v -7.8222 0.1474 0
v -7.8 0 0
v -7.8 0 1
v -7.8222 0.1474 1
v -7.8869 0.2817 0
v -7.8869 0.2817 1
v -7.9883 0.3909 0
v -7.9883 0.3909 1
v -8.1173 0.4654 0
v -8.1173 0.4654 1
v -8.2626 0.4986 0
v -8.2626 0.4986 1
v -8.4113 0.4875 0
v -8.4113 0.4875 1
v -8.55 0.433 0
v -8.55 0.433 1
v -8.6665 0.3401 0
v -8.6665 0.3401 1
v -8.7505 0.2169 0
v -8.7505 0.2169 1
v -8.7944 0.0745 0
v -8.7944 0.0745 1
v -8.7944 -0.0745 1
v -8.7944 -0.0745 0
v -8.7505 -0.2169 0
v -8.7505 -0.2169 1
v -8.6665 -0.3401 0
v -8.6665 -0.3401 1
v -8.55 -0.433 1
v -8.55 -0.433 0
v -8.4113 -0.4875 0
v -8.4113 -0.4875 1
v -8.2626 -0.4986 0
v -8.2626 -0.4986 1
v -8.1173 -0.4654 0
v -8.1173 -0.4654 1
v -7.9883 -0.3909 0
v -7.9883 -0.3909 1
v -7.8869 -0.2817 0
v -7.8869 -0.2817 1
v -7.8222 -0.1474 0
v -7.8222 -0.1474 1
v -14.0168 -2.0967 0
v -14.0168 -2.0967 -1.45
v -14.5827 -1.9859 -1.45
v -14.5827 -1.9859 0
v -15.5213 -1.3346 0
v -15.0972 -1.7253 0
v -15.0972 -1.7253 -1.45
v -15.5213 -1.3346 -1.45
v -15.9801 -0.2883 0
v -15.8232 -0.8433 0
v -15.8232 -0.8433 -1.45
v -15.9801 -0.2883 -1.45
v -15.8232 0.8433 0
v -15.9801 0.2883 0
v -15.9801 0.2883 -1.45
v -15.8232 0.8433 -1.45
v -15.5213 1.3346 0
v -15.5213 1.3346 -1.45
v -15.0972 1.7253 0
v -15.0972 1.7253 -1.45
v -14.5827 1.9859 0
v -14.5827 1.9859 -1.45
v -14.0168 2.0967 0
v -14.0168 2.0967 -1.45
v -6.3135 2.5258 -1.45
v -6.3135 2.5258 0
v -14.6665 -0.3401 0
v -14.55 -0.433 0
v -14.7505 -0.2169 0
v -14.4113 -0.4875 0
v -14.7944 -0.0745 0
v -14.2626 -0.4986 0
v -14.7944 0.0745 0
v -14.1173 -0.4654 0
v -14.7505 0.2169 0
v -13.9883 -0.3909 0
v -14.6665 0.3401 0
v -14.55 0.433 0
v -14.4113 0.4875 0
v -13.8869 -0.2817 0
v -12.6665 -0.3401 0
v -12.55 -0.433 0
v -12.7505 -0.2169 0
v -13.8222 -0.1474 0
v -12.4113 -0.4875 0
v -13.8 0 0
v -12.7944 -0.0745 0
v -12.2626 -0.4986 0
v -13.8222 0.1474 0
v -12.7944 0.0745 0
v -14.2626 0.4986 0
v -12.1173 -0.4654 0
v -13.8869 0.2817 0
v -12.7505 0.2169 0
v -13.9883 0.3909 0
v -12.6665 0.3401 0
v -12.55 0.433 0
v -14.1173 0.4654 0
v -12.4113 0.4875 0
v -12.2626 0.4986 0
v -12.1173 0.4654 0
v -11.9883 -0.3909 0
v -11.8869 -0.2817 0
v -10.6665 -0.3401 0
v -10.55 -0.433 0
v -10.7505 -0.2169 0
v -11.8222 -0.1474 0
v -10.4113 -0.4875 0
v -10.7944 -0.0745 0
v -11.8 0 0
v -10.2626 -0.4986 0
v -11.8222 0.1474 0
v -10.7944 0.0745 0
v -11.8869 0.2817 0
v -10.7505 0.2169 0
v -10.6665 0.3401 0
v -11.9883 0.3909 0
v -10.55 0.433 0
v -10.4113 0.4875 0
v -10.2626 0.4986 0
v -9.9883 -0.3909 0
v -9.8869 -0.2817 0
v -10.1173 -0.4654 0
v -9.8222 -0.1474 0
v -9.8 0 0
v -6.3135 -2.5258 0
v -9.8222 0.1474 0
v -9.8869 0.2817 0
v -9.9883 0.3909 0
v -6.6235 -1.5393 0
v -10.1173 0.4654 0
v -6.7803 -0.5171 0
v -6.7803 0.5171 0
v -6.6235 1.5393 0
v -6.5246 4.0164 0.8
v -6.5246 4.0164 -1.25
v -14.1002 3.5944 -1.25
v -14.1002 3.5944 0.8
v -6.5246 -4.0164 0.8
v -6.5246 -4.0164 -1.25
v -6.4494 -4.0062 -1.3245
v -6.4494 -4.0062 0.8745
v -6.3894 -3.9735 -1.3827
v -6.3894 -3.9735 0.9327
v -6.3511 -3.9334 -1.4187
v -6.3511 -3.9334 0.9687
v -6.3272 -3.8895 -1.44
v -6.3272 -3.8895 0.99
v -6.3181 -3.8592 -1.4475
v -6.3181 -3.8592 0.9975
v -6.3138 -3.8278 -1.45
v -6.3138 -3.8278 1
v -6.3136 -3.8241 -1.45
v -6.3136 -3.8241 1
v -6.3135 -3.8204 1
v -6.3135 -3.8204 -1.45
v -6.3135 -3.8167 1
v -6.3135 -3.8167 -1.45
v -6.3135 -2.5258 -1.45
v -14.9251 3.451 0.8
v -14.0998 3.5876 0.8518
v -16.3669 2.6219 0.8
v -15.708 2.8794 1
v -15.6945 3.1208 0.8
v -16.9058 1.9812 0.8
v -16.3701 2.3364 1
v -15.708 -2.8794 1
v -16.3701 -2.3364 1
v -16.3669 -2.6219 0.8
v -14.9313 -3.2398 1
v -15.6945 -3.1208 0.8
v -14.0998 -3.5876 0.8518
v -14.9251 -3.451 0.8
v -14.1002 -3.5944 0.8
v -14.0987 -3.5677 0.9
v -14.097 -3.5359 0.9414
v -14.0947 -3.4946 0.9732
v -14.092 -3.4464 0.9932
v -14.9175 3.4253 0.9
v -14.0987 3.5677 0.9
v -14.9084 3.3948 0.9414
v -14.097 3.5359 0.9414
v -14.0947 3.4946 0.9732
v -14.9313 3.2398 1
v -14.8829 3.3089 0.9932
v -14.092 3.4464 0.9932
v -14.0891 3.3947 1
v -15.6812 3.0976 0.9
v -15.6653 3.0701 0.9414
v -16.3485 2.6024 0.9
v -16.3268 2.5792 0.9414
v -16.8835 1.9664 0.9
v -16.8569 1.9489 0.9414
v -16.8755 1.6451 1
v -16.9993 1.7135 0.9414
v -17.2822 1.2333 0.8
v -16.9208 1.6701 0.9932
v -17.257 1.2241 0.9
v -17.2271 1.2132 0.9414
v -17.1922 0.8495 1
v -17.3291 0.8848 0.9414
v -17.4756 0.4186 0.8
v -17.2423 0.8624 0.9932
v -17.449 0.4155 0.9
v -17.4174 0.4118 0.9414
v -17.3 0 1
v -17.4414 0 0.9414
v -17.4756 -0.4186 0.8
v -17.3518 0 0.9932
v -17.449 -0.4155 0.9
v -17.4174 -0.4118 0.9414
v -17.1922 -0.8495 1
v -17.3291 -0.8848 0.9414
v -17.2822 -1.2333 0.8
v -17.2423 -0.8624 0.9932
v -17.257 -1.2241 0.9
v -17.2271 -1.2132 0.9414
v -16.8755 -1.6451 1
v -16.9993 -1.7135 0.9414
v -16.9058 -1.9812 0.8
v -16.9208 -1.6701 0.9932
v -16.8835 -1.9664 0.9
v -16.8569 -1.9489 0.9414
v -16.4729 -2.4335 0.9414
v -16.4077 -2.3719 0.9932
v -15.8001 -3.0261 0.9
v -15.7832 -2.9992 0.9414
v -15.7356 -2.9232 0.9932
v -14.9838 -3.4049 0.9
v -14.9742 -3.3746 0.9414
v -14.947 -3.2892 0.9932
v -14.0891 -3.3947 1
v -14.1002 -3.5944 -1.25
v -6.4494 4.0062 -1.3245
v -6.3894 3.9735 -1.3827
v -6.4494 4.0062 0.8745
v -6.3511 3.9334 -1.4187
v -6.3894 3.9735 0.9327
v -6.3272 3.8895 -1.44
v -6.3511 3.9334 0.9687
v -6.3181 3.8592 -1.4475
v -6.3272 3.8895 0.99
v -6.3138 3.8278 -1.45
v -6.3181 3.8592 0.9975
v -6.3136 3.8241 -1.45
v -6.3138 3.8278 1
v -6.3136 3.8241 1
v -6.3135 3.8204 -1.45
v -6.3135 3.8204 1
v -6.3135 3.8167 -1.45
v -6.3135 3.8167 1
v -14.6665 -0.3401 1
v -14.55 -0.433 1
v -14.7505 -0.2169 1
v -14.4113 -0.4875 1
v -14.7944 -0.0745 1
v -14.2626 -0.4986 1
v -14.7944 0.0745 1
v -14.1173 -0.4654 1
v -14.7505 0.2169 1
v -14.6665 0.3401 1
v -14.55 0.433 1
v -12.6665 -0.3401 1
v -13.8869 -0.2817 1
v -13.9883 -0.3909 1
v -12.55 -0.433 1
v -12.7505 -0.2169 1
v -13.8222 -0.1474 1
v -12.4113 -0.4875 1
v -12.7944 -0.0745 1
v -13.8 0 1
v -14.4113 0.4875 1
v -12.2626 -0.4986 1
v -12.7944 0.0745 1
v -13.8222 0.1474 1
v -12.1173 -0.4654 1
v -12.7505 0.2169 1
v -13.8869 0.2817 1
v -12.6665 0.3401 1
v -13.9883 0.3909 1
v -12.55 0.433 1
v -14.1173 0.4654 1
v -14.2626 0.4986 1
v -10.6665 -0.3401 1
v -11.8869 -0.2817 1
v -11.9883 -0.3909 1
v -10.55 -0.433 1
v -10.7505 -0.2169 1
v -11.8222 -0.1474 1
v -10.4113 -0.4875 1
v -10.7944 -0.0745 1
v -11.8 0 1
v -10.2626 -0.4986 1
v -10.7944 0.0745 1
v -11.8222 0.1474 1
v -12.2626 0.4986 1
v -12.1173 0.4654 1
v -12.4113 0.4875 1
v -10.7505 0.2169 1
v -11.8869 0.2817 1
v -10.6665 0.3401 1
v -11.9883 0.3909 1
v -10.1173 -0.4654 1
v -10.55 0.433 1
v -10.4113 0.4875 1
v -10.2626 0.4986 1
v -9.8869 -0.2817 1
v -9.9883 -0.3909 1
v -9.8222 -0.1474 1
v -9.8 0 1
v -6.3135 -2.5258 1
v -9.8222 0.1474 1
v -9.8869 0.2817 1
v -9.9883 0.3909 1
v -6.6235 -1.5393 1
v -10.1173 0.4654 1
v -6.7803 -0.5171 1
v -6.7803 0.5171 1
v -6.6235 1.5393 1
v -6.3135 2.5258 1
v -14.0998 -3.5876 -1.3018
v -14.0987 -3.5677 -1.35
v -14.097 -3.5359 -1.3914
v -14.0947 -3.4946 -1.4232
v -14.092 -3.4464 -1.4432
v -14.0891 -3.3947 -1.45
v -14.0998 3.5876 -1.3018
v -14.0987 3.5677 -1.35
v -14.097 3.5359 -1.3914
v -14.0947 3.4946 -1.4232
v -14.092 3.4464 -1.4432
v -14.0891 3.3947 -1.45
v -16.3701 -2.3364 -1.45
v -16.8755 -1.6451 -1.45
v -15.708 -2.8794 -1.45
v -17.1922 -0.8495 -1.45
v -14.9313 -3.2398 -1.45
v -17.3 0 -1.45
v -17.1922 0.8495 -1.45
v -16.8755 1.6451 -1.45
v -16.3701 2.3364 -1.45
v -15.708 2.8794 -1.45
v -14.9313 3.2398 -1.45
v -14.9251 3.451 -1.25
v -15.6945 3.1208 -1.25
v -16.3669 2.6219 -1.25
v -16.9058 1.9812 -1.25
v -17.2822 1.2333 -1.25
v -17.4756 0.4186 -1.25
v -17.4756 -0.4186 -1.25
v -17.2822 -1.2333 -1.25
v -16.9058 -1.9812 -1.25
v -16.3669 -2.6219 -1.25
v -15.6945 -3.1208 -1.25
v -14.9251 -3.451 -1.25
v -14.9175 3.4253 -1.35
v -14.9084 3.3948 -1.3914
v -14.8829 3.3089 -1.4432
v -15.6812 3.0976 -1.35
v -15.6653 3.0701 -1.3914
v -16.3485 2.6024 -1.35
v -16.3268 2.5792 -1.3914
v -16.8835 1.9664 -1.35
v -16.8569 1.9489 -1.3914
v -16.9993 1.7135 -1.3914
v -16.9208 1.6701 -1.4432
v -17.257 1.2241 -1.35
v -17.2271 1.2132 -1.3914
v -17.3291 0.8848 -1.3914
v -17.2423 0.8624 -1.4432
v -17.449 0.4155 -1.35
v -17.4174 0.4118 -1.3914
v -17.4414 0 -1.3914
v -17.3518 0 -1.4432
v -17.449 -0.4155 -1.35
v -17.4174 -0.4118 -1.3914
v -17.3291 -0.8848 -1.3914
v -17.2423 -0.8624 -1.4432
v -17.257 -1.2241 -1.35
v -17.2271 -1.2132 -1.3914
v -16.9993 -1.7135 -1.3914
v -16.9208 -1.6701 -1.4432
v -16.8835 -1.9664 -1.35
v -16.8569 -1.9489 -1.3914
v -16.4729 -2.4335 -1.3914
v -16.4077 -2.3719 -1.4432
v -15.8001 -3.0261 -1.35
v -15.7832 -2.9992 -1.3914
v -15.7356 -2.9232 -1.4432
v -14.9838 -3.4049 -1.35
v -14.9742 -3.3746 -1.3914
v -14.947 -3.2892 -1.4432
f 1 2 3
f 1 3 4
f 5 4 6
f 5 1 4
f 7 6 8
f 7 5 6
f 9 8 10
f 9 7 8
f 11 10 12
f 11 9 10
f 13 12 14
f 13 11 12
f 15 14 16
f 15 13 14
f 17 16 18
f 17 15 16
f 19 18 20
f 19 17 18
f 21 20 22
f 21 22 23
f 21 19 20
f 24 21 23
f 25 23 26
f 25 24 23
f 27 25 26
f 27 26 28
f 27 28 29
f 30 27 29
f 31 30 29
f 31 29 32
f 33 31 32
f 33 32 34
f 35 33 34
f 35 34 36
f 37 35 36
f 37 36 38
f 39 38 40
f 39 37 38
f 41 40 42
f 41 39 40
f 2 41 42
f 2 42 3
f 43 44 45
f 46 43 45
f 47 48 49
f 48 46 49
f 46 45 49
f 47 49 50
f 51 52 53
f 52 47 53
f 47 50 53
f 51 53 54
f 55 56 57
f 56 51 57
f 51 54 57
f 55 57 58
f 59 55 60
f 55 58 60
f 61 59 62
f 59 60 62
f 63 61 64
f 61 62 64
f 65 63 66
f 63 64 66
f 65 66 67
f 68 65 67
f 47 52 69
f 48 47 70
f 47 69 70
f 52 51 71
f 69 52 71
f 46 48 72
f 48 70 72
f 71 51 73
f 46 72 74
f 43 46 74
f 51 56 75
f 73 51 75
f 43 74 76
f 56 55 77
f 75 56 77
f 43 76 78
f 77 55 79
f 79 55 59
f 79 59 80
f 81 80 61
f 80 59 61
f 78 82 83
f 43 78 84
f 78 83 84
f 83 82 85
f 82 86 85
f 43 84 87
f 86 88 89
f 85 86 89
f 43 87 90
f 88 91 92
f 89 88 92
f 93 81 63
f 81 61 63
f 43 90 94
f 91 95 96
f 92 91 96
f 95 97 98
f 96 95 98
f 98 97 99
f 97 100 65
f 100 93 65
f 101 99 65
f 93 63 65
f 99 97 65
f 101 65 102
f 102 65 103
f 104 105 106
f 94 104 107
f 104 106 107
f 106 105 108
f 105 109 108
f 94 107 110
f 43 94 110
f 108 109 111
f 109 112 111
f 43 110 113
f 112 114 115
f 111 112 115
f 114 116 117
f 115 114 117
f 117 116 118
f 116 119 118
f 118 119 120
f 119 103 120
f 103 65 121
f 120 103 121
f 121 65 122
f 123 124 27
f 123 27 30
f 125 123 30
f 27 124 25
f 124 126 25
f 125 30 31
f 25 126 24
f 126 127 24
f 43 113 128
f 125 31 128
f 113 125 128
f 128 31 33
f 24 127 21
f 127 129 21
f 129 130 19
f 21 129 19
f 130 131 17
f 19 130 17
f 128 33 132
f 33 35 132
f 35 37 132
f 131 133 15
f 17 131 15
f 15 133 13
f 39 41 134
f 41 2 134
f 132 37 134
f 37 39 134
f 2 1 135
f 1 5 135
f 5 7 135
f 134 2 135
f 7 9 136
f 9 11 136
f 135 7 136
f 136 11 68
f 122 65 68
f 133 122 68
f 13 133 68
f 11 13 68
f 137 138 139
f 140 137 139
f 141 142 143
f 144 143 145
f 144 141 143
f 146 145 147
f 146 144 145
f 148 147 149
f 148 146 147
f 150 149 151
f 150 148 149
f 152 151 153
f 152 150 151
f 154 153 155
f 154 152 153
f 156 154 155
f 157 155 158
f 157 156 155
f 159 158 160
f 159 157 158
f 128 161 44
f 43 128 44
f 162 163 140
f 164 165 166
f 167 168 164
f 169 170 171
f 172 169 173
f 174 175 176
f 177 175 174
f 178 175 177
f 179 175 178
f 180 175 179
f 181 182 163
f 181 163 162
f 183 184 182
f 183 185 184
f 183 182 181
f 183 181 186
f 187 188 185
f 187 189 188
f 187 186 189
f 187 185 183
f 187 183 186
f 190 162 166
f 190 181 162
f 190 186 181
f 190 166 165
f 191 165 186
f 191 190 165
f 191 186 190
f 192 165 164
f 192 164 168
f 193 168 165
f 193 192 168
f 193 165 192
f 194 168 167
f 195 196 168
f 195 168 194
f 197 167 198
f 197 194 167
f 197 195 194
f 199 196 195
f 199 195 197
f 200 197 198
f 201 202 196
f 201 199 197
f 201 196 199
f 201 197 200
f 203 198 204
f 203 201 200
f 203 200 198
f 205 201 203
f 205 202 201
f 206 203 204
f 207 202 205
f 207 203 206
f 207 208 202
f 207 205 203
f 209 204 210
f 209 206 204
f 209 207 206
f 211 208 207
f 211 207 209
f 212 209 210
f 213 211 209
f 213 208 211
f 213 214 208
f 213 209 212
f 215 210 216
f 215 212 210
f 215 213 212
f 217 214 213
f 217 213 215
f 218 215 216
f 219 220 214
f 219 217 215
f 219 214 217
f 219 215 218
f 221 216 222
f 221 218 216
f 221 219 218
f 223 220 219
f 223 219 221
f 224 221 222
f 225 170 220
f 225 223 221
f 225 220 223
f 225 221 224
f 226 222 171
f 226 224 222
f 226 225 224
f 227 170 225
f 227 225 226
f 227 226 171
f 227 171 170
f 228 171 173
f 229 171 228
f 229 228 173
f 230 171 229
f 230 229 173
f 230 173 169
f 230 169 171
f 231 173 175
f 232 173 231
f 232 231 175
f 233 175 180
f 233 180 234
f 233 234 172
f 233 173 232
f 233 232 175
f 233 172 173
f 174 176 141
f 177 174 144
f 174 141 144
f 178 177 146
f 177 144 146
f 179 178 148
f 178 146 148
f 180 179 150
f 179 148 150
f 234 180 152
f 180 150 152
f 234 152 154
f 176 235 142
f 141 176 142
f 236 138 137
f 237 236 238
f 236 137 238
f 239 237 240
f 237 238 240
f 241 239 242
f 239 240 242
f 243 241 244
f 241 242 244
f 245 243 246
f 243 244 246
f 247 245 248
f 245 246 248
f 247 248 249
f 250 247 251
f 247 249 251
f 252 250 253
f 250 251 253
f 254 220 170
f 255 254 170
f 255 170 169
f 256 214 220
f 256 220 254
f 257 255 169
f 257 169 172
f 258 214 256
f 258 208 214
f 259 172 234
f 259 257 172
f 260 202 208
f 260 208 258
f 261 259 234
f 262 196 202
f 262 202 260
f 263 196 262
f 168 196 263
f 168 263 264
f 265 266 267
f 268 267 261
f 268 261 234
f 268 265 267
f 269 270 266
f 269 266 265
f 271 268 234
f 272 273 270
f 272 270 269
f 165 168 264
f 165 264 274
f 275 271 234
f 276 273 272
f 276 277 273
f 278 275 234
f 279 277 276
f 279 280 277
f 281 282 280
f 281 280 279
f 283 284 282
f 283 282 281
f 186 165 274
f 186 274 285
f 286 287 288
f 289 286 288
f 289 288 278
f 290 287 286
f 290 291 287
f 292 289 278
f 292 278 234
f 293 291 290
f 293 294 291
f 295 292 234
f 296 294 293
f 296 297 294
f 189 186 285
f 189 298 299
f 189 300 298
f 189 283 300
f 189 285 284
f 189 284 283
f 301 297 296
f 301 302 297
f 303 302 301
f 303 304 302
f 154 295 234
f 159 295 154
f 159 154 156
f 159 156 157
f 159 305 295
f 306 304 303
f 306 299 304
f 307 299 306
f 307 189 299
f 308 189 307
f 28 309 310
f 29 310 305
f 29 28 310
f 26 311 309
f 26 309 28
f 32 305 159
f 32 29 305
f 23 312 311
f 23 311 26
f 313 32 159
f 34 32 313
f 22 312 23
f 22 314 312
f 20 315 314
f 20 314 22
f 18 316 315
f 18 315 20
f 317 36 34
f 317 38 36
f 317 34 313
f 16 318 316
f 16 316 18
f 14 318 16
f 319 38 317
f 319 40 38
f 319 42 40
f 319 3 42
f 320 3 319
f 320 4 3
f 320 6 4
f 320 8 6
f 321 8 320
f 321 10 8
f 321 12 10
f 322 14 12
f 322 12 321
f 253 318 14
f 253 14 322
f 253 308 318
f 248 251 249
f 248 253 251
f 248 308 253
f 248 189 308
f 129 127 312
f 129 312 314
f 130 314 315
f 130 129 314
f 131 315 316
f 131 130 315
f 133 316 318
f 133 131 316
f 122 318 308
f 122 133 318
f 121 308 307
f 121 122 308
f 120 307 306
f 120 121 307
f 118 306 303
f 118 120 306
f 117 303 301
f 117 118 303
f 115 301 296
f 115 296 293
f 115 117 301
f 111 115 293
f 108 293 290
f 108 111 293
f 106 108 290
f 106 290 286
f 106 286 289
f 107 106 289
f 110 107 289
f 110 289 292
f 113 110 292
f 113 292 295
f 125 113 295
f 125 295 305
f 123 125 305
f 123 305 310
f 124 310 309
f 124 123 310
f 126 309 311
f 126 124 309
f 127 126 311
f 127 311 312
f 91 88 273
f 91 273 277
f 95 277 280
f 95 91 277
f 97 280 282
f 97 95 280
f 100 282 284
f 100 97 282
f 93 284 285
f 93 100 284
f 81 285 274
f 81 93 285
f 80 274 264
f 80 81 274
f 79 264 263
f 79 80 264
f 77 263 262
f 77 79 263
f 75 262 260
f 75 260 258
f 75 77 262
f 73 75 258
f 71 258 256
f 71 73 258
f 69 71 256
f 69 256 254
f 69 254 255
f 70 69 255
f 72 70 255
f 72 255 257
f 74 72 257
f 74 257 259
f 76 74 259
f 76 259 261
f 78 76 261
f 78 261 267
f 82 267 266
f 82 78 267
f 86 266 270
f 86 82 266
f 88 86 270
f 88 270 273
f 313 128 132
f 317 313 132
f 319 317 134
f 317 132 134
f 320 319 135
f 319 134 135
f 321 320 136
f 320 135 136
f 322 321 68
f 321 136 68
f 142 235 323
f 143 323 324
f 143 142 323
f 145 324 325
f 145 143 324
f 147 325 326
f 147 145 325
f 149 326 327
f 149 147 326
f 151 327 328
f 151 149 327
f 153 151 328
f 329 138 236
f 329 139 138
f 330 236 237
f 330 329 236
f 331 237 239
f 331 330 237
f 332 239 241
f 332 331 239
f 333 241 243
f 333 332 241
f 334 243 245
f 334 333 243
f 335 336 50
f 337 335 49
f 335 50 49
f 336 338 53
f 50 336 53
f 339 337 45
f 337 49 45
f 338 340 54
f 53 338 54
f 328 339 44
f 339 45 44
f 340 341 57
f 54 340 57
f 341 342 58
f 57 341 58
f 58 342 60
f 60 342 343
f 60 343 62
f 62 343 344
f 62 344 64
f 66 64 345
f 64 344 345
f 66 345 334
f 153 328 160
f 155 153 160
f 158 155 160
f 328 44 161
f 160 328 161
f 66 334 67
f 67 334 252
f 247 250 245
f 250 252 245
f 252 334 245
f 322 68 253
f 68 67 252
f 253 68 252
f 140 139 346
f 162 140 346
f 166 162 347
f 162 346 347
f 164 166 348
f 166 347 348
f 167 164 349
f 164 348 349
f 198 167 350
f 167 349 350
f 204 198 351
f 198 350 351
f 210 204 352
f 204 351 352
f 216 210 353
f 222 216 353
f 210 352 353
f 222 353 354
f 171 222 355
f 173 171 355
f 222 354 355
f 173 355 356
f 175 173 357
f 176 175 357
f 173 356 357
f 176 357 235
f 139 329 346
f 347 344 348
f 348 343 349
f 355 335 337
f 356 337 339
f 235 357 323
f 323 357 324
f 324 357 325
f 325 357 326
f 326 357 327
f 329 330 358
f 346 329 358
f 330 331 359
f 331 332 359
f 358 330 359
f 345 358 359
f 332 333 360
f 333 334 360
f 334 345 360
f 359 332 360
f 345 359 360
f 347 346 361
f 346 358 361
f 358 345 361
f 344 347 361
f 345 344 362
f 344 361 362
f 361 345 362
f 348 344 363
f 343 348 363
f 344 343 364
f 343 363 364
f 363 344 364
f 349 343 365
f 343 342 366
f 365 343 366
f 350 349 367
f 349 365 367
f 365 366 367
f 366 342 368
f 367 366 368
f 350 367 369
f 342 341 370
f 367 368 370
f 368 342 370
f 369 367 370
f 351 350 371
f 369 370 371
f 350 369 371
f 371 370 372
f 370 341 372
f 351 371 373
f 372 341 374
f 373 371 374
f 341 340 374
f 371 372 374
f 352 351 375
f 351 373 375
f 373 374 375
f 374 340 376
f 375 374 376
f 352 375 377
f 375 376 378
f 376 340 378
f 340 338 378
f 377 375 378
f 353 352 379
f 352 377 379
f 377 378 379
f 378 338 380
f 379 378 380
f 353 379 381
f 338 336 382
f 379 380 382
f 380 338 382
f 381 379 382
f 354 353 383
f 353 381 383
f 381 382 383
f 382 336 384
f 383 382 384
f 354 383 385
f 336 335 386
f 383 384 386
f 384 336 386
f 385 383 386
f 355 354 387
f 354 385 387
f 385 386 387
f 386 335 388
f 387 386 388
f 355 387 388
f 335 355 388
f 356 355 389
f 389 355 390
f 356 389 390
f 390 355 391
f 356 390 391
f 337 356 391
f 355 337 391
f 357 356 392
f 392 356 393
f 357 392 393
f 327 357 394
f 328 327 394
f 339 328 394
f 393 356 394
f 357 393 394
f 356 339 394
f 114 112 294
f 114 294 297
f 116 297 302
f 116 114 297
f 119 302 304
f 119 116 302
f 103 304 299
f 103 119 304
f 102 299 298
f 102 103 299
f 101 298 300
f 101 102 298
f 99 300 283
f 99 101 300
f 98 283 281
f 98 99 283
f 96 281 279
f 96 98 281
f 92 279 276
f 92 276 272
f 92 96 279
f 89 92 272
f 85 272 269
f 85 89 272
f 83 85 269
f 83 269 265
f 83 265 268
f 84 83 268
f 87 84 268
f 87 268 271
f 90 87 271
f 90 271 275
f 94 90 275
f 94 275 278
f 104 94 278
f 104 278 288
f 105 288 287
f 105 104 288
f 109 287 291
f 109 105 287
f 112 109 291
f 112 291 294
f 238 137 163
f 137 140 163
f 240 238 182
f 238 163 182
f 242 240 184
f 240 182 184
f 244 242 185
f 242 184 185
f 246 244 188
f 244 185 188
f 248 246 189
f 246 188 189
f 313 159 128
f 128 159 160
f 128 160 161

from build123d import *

# Parameters (mm, degrees)
SKETCH_1_R      = 0.5
EXTRUDE_1_DEPTH = 1
EXTRUDE_START   = -2.45
EXTRUDE_2_DEPTH = 2.45
FILLET_1_R      = 0.2


with BuildPart() as part:
    # 草图1 → 凸台-拉伸1 (new body)
    with BuildSketch(Plane.XY):
        with BuildLine():
            Line((-14.016792693, -2.096749739), (-6.313489141, -2.525837459))
            ThreePointArc((-6.313489141, -2.525837459), (-6.8, 0), (-6.313489141, 2.525837459))
            Line((-6.313489141, 2.525837459), (-14.016792693, 2.096749739))
            ThreePointArc((-14.016792693, 2.096749739), (-16, 0), (-14.016792693, -2.096749739))
        make_face()
        with Locations((-10.3, 0)):
            Circle(SKETCH_1_R, mode=Mode.SUBTRACT)
        with Locations((-14.3, 0)):
            Circle(SKETCH_1_R, mode=Mode.SUBTRACT)
        with Locations((-8.3, 0)):
            Circle(SKETCH_1_R, mode=Mode.SUBTRACT)
        with Locations((-12.3, 0)):
            Circle(SKETCH_1_R, mode=Mode.SUBTRACT)
    extrude(amount=EXTRUDE_1_DEPTH)

    # 草图3 → 凸台-拉伸2 (add)
    with BuildSketch(Plane.XY.offset(1).offset(EXTRUDE_START)):
        with BuildLine():
            Line((-6.313489141, 4.028162673), (-14.100216045, 3.594428124))
            ThreePointArc((-14.100216045, 3.594428124), (-17.5, 0), (-14.100216045, -3.594428124))
            Line((-14.100216045, -3.594428124), (-6.313489141, -4.028162673))
            Line((-6.313489141, -4.028162673), (-6.313489141, -2.525837459))
            Line((-6.313489141, -2.525837459), (-14.016792693, -2.096749739))
            ThreePointArc((-14.016792693, -2.096749739), (-16, 0), (-14.016792693, 2.096749739))
            Line((-14.016792693, 2.096749739), (-6.313489141, 2.525837459))
            Line((-6.313489141, 2.525837459), (-6.313489141, 4.028162673))
        make_face()
    extrude(amount=EXTRUDE_2_DEPTH)

    # 圆角1
    fillet_1_edges = [part.edges().sort_by_distance(p)[0] for p in [
        (-10.206852593, 3.811295398, 1),
        (-17.5, 0, 1),
        (-10.206852593, -3.811295398, 1),
        (-17.5, 0, -1.45),
        (-10.206852593, -3.811295398, -1.45),
        (-6.313489141, -4.028162673, -0.225),
        (-6.313489141, 4.028162673, -0.225),
        (-10.206852593, 3.811295398, -1.45),
    ]]
    fillet(fillet_1_edges, radius=FILLET_1_R)


solid = part.part
